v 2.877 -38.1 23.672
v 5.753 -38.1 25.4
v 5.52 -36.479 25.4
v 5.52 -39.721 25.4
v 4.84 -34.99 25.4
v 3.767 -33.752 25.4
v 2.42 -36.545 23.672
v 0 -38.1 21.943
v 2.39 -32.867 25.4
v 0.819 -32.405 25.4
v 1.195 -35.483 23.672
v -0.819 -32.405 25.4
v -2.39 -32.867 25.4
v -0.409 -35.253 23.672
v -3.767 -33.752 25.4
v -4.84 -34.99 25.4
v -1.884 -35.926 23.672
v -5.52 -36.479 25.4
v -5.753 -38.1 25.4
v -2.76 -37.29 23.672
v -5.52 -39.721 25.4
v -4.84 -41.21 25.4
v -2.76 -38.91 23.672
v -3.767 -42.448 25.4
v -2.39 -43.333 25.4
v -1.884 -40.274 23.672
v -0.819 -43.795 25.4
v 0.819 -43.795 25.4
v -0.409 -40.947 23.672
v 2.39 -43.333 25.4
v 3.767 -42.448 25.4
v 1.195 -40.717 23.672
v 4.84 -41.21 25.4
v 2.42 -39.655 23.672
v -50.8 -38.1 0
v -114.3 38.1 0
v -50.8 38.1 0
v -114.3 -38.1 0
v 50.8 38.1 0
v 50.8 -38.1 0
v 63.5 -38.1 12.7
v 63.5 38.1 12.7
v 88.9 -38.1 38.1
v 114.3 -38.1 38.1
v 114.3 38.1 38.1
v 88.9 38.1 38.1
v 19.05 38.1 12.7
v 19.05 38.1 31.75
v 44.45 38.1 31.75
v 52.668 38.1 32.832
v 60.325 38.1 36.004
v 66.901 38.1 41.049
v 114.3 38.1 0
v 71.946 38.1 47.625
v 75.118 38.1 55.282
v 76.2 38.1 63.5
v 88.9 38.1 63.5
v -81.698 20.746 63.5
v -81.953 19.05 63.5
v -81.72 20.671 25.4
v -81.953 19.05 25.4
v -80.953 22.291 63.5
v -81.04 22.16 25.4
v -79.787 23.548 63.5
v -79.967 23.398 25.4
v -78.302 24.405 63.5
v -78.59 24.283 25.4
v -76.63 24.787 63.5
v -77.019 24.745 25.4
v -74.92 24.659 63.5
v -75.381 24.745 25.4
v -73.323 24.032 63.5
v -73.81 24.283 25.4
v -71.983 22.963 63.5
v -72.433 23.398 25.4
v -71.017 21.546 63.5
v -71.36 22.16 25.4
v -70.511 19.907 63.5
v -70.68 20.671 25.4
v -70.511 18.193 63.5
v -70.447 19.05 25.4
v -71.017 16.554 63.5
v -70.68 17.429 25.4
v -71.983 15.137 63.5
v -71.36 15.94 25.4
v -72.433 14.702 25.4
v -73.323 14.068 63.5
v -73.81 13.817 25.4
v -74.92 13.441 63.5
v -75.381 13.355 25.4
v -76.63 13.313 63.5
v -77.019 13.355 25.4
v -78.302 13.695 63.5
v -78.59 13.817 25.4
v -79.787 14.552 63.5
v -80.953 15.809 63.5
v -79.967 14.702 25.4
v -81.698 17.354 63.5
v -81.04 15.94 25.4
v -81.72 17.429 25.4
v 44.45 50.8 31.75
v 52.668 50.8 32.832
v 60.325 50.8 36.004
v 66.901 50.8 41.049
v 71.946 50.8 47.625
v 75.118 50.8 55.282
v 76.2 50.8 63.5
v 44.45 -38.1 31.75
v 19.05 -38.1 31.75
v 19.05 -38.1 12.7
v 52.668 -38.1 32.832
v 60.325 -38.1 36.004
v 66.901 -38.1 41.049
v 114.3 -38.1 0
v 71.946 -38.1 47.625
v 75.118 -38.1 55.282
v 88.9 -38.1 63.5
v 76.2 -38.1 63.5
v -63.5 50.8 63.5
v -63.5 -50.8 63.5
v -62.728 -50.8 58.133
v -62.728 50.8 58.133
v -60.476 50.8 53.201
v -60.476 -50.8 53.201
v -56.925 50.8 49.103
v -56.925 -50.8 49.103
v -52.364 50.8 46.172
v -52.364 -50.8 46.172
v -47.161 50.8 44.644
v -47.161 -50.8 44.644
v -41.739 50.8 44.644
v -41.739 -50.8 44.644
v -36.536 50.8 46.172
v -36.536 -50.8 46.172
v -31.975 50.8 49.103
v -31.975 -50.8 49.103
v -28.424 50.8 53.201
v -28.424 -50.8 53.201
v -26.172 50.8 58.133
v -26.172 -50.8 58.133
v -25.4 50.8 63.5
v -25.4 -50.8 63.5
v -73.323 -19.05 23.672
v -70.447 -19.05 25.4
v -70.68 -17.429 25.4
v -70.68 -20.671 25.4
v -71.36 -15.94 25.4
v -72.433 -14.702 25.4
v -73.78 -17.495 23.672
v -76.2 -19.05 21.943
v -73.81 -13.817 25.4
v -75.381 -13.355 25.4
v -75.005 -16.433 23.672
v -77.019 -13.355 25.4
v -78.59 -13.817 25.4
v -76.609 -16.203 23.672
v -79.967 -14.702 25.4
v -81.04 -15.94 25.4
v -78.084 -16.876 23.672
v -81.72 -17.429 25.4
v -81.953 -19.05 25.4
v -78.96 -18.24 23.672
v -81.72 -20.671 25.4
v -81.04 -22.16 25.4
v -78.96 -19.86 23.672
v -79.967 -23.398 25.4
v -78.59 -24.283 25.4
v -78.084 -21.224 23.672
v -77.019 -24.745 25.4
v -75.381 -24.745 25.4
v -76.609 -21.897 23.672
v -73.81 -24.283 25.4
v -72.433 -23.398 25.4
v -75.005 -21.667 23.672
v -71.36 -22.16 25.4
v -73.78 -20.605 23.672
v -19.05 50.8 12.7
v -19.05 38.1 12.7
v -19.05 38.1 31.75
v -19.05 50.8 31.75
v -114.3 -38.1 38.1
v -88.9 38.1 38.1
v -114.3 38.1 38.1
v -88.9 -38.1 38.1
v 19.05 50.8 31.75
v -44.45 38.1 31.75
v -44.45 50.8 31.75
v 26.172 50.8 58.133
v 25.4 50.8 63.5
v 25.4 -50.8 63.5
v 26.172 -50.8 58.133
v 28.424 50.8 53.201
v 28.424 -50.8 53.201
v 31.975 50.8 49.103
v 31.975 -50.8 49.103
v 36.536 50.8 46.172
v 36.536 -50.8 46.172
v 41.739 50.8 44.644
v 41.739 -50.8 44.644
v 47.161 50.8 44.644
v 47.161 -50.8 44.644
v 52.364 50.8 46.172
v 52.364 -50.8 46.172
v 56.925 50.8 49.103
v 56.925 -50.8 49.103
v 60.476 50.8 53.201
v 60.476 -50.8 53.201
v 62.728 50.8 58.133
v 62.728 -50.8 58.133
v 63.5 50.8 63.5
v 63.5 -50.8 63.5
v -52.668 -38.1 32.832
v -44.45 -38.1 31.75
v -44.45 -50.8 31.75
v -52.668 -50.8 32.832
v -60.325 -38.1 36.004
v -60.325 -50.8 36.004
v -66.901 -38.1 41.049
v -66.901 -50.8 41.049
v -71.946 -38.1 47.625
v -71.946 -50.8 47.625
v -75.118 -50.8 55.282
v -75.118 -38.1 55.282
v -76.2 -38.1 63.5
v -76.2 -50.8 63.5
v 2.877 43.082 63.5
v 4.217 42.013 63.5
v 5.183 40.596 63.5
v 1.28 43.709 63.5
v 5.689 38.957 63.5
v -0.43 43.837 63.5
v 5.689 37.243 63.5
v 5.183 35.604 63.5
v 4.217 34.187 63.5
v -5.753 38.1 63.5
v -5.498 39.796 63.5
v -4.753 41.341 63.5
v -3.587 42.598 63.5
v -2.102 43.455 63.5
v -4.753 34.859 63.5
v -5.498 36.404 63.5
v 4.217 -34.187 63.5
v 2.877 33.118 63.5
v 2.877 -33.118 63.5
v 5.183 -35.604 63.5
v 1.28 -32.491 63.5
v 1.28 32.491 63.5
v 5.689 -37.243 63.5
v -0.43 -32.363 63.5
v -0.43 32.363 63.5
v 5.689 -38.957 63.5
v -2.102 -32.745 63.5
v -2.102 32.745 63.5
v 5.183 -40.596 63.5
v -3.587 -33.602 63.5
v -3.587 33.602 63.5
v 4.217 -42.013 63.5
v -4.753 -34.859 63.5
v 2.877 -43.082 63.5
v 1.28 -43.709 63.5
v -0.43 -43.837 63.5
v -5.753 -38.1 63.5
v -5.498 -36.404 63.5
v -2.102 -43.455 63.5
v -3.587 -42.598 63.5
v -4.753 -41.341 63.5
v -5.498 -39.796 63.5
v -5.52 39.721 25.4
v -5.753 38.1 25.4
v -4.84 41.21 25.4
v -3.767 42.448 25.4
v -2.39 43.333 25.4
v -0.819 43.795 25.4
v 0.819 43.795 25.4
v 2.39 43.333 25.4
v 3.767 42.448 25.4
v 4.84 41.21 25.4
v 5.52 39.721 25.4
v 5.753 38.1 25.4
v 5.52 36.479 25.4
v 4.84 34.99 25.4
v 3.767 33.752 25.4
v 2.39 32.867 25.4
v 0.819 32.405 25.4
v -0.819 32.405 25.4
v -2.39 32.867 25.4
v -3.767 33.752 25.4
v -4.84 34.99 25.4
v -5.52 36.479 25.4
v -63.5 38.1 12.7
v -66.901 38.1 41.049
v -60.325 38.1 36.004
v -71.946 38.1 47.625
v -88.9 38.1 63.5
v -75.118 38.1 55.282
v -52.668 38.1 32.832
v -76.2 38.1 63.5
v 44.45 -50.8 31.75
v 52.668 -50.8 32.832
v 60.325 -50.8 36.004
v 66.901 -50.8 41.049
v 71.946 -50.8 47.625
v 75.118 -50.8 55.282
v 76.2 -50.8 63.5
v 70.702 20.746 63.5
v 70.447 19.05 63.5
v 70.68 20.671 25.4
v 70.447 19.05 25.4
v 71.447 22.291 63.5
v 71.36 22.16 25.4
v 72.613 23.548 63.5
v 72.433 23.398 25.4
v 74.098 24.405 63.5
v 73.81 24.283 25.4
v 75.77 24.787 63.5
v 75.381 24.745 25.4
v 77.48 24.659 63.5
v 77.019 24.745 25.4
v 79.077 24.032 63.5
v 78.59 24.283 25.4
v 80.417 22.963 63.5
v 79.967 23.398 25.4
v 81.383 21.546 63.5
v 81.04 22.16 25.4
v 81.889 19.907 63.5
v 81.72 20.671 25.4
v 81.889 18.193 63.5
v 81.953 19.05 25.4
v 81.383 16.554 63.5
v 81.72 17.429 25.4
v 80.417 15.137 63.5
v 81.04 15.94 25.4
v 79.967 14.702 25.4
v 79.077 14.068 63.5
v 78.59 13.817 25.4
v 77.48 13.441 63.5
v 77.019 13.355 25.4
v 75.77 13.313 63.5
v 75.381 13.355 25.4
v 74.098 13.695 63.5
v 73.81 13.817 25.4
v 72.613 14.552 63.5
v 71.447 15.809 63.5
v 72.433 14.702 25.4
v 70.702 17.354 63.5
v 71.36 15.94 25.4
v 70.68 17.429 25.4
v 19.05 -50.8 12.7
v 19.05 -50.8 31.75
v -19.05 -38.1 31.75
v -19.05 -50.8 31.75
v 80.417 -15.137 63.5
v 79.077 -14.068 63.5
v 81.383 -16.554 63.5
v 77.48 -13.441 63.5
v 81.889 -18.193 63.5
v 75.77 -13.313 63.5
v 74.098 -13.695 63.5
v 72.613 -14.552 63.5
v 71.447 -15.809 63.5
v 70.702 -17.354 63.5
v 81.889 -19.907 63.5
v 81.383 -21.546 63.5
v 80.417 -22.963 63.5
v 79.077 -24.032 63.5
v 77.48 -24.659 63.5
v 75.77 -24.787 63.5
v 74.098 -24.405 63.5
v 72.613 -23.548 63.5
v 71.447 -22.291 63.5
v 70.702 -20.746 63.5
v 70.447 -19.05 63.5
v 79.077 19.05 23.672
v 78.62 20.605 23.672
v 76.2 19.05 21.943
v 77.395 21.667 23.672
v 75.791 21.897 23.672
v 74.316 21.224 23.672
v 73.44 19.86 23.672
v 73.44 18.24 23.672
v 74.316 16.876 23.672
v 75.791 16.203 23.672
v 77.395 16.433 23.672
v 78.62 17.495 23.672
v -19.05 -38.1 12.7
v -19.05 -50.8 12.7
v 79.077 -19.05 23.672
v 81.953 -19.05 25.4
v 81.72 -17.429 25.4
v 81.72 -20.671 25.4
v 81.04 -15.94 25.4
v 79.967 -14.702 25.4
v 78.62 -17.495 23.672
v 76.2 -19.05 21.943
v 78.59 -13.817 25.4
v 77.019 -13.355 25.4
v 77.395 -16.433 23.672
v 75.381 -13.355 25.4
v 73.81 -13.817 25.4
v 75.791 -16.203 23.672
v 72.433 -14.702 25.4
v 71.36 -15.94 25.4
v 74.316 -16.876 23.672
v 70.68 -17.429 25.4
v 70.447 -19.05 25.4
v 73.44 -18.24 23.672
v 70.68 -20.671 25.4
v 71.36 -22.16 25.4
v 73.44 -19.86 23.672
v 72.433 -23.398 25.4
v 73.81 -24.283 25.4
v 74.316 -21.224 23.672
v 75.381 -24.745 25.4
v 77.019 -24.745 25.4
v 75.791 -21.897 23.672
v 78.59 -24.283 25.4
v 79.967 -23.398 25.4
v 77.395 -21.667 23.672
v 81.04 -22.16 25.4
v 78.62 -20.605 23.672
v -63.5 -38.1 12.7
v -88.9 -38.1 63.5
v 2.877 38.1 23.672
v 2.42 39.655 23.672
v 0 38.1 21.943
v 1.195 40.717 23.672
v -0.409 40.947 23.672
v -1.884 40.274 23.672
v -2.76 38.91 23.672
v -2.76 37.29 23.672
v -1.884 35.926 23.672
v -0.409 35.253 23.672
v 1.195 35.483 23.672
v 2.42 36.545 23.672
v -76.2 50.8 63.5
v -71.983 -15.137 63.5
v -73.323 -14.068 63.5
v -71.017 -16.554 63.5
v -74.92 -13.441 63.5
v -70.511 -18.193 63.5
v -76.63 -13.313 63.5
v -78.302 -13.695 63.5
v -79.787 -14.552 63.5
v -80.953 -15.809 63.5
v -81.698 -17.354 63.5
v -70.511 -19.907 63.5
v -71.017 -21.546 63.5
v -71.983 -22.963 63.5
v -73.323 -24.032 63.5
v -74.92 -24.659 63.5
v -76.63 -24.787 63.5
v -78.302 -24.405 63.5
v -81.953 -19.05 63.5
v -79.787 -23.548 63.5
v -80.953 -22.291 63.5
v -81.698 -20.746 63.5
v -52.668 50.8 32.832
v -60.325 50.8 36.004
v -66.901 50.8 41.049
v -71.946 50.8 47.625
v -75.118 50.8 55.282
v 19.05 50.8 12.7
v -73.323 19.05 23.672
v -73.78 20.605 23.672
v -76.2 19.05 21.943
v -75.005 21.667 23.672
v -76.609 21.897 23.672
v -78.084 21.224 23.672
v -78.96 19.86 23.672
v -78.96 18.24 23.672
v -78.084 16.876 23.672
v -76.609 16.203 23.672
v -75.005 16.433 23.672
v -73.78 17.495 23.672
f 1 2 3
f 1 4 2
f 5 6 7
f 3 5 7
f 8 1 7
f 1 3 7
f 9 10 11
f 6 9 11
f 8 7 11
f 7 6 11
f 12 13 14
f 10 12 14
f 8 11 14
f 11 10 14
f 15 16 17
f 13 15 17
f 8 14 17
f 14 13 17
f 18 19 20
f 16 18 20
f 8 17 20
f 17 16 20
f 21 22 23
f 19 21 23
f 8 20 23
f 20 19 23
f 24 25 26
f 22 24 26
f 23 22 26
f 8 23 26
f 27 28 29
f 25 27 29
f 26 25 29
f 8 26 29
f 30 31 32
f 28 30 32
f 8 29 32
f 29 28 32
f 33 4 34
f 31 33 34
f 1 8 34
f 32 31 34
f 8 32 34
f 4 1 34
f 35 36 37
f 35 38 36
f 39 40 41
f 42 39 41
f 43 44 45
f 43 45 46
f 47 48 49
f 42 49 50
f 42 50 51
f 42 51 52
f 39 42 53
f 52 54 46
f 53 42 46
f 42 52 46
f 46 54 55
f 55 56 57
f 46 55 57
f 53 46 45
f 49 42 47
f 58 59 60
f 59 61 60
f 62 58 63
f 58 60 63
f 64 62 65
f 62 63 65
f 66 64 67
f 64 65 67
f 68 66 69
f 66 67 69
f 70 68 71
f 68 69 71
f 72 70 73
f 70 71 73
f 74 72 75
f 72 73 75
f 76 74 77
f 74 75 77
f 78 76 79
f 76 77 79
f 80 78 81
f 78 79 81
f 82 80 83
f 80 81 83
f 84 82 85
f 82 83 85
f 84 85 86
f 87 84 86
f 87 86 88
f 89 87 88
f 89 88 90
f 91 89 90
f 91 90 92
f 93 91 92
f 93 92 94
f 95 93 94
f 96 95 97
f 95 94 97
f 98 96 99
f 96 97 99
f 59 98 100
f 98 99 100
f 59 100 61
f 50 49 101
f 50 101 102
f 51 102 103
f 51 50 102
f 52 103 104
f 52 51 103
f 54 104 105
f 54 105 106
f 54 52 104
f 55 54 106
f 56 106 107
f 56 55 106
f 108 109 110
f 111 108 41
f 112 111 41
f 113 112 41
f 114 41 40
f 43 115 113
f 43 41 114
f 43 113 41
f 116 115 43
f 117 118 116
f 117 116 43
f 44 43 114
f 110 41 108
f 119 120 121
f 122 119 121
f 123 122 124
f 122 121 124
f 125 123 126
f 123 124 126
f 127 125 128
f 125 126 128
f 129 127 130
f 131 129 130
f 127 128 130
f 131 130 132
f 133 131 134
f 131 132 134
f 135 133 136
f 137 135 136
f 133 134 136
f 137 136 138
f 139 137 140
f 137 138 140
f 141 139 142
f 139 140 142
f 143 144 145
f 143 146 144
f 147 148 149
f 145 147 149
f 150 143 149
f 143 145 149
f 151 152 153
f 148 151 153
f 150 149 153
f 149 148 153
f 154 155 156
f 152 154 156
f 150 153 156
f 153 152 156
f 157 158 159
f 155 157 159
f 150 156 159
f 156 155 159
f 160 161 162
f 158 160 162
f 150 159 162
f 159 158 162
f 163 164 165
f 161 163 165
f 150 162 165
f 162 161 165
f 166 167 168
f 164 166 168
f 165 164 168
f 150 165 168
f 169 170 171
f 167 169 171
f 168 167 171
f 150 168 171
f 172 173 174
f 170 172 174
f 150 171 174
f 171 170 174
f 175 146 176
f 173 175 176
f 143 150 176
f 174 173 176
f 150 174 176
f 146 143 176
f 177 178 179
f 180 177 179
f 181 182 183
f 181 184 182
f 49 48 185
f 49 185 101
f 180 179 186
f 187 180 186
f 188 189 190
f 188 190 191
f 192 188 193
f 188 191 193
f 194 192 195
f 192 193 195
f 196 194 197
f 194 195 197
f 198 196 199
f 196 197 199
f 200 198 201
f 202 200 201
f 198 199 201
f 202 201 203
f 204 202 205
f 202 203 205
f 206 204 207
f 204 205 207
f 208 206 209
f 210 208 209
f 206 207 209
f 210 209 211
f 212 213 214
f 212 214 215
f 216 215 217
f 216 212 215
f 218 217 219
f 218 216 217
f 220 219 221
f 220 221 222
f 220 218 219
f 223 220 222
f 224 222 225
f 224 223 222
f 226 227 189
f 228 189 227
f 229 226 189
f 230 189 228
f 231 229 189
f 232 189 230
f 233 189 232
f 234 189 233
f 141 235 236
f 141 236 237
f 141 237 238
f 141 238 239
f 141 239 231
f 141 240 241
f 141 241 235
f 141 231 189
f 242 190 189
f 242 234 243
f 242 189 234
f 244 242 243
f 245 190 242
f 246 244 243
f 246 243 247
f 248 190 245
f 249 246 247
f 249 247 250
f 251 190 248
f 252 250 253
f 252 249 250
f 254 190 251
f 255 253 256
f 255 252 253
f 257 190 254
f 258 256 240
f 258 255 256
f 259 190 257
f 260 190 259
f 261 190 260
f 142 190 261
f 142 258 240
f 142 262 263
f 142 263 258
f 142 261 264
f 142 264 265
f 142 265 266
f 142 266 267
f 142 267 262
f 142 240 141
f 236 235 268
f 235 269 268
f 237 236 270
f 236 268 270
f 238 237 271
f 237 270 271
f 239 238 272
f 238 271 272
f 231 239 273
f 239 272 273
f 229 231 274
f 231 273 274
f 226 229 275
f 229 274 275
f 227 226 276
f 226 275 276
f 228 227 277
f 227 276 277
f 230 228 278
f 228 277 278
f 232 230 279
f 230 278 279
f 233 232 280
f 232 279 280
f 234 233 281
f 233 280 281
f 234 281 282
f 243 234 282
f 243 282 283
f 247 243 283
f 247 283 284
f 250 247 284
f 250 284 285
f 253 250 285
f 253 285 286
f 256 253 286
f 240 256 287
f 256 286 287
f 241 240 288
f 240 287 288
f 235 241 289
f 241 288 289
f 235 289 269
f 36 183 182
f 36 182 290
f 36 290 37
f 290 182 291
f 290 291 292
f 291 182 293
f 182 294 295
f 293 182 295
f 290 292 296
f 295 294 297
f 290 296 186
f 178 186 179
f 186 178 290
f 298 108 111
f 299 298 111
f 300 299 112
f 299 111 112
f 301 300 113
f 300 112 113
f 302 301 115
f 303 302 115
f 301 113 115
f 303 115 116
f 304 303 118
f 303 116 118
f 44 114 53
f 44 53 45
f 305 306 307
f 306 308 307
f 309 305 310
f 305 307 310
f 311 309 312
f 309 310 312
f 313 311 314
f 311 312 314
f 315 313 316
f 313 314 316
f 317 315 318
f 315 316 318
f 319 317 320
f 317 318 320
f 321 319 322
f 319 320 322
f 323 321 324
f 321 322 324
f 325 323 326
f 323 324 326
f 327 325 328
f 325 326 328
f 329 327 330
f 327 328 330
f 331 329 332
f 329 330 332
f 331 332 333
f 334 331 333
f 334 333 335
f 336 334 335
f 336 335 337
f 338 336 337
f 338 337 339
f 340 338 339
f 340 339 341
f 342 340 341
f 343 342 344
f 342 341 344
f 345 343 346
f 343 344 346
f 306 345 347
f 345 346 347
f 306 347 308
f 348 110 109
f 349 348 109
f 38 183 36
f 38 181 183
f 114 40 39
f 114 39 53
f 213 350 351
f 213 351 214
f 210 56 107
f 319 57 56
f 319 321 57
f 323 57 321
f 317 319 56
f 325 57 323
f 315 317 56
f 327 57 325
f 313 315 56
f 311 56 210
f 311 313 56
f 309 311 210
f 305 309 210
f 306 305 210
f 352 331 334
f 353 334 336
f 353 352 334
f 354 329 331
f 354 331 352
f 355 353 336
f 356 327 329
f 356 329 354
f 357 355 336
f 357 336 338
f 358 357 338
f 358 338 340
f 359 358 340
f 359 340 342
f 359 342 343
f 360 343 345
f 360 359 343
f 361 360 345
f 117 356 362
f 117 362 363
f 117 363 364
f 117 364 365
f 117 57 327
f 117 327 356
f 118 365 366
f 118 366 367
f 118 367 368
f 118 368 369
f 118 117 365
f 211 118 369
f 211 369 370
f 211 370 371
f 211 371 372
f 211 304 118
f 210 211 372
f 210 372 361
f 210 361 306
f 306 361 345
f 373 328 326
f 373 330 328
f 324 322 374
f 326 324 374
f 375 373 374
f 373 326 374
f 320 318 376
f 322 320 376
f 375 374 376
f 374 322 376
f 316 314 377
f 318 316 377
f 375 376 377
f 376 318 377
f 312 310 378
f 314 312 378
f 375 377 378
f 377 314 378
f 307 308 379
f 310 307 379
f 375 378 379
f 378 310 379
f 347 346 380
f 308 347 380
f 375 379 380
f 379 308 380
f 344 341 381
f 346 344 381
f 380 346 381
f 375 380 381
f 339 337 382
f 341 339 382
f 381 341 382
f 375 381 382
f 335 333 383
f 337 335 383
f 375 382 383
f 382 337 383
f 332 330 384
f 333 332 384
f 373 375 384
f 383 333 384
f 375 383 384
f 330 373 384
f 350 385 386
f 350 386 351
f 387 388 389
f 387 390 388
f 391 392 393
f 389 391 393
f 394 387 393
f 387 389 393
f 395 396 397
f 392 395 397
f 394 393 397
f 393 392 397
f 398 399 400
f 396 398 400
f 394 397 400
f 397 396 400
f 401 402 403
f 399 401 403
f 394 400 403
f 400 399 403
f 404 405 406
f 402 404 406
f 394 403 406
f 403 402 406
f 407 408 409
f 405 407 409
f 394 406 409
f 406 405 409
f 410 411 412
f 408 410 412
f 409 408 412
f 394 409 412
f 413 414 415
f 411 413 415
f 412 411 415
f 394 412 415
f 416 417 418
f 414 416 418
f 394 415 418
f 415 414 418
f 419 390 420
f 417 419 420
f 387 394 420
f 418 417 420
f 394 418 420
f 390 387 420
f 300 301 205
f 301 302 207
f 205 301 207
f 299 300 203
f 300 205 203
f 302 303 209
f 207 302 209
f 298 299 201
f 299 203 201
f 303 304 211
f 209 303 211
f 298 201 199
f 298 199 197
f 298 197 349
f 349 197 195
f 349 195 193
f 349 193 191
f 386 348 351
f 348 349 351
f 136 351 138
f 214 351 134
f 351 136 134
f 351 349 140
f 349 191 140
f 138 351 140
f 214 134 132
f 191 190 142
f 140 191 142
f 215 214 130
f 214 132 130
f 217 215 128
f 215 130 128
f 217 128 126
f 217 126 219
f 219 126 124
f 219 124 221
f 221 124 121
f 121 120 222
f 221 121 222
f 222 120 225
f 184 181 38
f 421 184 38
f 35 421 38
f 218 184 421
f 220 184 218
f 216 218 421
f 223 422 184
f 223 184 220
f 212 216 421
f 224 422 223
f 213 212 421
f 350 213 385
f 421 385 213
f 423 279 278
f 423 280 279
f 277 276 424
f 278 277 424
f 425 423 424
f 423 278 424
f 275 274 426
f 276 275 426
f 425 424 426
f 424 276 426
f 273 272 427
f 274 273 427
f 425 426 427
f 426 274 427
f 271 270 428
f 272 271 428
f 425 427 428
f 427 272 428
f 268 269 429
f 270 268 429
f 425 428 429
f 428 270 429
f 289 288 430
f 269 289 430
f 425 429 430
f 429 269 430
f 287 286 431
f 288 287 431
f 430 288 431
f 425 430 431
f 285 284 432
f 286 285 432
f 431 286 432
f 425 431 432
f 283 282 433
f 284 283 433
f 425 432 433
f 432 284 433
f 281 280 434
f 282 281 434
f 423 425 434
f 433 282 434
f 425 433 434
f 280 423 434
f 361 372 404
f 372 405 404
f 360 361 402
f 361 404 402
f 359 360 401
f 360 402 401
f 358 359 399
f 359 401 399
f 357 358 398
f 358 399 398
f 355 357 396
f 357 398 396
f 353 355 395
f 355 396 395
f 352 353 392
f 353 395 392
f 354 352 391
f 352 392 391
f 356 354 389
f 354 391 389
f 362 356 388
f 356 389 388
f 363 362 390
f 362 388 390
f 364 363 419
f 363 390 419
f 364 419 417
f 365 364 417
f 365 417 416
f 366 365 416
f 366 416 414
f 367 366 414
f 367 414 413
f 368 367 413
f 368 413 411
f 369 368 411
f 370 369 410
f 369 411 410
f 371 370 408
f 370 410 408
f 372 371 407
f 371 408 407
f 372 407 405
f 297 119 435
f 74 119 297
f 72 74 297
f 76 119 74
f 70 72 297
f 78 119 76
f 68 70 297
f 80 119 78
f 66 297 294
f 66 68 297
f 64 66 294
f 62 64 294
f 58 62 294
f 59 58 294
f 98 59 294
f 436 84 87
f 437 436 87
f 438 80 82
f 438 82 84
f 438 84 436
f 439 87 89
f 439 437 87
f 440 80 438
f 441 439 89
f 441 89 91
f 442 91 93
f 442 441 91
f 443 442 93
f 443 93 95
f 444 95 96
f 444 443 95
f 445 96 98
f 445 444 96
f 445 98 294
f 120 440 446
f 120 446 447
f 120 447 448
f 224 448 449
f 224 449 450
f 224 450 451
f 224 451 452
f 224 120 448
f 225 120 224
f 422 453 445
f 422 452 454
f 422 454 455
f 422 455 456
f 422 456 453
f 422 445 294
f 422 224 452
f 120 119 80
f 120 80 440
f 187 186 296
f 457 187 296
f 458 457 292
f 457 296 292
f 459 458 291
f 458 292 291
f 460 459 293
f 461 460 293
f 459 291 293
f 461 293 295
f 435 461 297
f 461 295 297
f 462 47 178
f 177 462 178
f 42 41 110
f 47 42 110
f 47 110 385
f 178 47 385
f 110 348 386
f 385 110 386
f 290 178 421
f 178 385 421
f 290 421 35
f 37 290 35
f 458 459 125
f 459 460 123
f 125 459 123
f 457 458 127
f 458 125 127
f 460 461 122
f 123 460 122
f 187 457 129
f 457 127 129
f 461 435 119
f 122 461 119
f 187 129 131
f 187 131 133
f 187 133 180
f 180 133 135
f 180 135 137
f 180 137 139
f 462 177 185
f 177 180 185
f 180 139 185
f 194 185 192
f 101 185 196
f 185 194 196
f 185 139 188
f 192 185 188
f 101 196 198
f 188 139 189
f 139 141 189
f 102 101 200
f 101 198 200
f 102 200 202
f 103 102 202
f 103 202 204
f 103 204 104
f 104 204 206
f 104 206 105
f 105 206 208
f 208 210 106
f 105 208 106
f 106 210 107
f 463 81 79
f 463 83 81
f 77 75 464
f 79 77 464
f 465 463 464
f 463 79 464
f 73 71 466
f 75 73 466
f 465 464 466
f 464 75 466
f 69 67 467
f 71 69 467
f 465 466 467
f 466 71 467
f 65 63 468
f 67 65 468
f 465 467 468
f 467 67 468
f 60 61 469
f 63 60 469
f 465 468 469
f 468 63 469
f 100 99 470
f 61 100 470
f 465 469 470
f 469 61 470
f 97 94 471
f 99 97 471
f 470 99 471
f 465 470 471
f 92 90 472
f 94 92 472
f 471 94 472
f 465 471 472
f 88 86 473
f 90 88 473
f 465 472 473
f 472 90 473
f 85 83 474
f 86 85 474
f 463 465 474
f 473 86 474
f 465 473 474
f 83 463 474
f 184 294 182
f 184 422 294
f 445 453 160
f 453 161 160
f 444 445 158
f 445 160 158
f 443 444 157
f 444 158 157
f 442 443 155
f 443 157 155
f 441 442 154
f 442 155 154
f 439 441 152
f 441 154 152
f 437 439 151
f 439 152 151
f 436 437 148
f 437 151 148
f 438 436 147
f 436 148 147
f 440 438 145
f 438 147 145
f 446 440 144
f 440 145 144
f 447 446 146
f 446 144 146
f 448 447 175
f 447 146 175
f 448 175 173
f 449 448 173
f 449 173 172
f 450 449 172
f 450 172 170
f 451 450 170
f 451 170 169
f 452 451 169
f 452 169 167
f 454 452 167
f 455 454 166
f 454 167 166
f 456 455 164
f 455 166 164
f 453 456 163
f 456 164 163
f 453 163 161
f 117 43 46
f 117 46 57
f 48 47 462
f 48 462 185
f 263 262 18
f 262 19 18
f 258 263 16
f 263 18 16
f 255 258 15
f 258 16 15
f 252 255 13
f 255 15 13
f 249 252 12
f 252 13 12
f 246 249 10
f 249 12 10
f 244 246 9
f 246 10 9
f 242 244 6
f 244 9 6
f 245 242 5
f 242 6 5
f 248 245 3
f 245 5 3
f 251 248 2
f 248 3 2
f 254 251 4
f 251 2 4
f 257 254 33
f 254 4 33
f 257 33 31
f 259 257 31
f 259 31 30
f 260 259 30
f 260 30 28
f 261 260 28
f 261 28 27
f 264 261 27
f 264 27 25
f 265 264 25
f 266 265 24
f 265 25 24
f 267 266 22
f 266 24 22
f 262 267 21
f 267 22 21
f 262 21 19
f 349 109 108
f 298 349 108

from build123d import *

# Parameters (mm, degrees)
F1_DEPTH         = 38.1
F3_DEPTH         = 12.7
F3_COPIES1_COUNT = 2
F5_DEPTH         = 101.601
F7_D             = 11.5062
F7_DEPTH         = 38.1
F7_TIP           = 3.4568112273
F9_DEPTH         = 101.601


# Not quite as in the source:
# - a pattern or mirror of a feature is missing from the dataset's text; its kind, count and spacing are read off the source's solid


with BuildPart() as f1:
    # F0 (on Front) → F1 (new body, symmetric)
    with BuildSketch(Plane.XZ):
        Polygon((-114.3, 38.1), (-114.3, 0), (114.3, 0), (114.3, 38.1), (88.9, 38.1), (88.9, 63.5), (-88.9, 63.5), (-88.9, 38.1), align=None)
    extrude(amount=F1_DEPTH, both=True)

    # F2 (on face) → F3 (join)
    with BuildSketch(Plane.XZ.offset(38.1)):
        with BuildLine():
            Line((19.05, 31.75), (44.45, 31.75))
            ThreePointArc((44.45, 31.75), (66.9006403027, 41.0493596973), (76.2, 63.5))
            Line((76.2, 63.5), (0, 63.5))
            Line((0, 63.5), (0, 0))
            Line((0, 0), (19.05, 0))
            Line((19.05, 0), (19.05, 31.75))
        make_face()
    f3 = extrude(amount=F3_DEPTH)

    # F3_copies: F3 across plane
    add(f3.mirror(Plane(origin=(0, 0, 0), x_dir=(0, 0, -1), z_dir=(-1, 0, 0))))

    # F3_copies1: F3 ×2 about axis
    f3_copies1_axis = Axis((0, 0, 0), (0, 0, 1))
    for i in range(1, F3_COPIES1_COUNT):
        add(f3.rotate(f3_copies1_axis, i * 360 / F3_COPIES1_COUNT))

    # F3_copies2: F3 across plane
    add(f3.mirror(Plane.ZX))

    # F4 (on face) → F5 (cut, through all)
    with BuildSketch(Plane.XZ.offset(50.8)):
        Polygon((-63.5, 12.7), (-50.8, 0), (50.8, 0), (63.5, 12.7), align=None)
    extrude(amount=-F5_DEPTH, mode=Mode.SUBTRACT)

    # F7
    with Locations(Plane.XY.offset(63.5)):
        with Locations((-76.2, 19.05), (-76.2, -19.05), (0, 38.1), (0, -38.1), (76.2, -19.05), (76.2, 19.05)):
            Hole(F7_D / 2, depth=F7_DEPTH)
            with Locations((0, 0, -(F7_DEPTH + F7_TIP / 2))):  # 118° drill point
                Cone(0, F7_D / 2, F7_TIP, mode=Mode.SUBTRACT)

    # F8 (on face) → F9 (cut, through all)
    with BuildSketch(Plane.XZ.offset(50.8)):
        with BuildLine():
            Line((-25.4, 63.5), (-63.5, 63.5))
            ThreePointArc((-63.5, 63.5), (-44.45, 44.45), (-25.4, 63.5))
        make_face()
        with BuildLine():
            Line((63.5, 63.5), (25.4, 63.5))
            ThreePointArc((25.4, 63.5), (44.45, 44.45), (63.5, 63.5))
        make_face()
    extrude(amount=-F9_DEPTH, mode=Mode.SUBTRACT)


solid = f1.part
